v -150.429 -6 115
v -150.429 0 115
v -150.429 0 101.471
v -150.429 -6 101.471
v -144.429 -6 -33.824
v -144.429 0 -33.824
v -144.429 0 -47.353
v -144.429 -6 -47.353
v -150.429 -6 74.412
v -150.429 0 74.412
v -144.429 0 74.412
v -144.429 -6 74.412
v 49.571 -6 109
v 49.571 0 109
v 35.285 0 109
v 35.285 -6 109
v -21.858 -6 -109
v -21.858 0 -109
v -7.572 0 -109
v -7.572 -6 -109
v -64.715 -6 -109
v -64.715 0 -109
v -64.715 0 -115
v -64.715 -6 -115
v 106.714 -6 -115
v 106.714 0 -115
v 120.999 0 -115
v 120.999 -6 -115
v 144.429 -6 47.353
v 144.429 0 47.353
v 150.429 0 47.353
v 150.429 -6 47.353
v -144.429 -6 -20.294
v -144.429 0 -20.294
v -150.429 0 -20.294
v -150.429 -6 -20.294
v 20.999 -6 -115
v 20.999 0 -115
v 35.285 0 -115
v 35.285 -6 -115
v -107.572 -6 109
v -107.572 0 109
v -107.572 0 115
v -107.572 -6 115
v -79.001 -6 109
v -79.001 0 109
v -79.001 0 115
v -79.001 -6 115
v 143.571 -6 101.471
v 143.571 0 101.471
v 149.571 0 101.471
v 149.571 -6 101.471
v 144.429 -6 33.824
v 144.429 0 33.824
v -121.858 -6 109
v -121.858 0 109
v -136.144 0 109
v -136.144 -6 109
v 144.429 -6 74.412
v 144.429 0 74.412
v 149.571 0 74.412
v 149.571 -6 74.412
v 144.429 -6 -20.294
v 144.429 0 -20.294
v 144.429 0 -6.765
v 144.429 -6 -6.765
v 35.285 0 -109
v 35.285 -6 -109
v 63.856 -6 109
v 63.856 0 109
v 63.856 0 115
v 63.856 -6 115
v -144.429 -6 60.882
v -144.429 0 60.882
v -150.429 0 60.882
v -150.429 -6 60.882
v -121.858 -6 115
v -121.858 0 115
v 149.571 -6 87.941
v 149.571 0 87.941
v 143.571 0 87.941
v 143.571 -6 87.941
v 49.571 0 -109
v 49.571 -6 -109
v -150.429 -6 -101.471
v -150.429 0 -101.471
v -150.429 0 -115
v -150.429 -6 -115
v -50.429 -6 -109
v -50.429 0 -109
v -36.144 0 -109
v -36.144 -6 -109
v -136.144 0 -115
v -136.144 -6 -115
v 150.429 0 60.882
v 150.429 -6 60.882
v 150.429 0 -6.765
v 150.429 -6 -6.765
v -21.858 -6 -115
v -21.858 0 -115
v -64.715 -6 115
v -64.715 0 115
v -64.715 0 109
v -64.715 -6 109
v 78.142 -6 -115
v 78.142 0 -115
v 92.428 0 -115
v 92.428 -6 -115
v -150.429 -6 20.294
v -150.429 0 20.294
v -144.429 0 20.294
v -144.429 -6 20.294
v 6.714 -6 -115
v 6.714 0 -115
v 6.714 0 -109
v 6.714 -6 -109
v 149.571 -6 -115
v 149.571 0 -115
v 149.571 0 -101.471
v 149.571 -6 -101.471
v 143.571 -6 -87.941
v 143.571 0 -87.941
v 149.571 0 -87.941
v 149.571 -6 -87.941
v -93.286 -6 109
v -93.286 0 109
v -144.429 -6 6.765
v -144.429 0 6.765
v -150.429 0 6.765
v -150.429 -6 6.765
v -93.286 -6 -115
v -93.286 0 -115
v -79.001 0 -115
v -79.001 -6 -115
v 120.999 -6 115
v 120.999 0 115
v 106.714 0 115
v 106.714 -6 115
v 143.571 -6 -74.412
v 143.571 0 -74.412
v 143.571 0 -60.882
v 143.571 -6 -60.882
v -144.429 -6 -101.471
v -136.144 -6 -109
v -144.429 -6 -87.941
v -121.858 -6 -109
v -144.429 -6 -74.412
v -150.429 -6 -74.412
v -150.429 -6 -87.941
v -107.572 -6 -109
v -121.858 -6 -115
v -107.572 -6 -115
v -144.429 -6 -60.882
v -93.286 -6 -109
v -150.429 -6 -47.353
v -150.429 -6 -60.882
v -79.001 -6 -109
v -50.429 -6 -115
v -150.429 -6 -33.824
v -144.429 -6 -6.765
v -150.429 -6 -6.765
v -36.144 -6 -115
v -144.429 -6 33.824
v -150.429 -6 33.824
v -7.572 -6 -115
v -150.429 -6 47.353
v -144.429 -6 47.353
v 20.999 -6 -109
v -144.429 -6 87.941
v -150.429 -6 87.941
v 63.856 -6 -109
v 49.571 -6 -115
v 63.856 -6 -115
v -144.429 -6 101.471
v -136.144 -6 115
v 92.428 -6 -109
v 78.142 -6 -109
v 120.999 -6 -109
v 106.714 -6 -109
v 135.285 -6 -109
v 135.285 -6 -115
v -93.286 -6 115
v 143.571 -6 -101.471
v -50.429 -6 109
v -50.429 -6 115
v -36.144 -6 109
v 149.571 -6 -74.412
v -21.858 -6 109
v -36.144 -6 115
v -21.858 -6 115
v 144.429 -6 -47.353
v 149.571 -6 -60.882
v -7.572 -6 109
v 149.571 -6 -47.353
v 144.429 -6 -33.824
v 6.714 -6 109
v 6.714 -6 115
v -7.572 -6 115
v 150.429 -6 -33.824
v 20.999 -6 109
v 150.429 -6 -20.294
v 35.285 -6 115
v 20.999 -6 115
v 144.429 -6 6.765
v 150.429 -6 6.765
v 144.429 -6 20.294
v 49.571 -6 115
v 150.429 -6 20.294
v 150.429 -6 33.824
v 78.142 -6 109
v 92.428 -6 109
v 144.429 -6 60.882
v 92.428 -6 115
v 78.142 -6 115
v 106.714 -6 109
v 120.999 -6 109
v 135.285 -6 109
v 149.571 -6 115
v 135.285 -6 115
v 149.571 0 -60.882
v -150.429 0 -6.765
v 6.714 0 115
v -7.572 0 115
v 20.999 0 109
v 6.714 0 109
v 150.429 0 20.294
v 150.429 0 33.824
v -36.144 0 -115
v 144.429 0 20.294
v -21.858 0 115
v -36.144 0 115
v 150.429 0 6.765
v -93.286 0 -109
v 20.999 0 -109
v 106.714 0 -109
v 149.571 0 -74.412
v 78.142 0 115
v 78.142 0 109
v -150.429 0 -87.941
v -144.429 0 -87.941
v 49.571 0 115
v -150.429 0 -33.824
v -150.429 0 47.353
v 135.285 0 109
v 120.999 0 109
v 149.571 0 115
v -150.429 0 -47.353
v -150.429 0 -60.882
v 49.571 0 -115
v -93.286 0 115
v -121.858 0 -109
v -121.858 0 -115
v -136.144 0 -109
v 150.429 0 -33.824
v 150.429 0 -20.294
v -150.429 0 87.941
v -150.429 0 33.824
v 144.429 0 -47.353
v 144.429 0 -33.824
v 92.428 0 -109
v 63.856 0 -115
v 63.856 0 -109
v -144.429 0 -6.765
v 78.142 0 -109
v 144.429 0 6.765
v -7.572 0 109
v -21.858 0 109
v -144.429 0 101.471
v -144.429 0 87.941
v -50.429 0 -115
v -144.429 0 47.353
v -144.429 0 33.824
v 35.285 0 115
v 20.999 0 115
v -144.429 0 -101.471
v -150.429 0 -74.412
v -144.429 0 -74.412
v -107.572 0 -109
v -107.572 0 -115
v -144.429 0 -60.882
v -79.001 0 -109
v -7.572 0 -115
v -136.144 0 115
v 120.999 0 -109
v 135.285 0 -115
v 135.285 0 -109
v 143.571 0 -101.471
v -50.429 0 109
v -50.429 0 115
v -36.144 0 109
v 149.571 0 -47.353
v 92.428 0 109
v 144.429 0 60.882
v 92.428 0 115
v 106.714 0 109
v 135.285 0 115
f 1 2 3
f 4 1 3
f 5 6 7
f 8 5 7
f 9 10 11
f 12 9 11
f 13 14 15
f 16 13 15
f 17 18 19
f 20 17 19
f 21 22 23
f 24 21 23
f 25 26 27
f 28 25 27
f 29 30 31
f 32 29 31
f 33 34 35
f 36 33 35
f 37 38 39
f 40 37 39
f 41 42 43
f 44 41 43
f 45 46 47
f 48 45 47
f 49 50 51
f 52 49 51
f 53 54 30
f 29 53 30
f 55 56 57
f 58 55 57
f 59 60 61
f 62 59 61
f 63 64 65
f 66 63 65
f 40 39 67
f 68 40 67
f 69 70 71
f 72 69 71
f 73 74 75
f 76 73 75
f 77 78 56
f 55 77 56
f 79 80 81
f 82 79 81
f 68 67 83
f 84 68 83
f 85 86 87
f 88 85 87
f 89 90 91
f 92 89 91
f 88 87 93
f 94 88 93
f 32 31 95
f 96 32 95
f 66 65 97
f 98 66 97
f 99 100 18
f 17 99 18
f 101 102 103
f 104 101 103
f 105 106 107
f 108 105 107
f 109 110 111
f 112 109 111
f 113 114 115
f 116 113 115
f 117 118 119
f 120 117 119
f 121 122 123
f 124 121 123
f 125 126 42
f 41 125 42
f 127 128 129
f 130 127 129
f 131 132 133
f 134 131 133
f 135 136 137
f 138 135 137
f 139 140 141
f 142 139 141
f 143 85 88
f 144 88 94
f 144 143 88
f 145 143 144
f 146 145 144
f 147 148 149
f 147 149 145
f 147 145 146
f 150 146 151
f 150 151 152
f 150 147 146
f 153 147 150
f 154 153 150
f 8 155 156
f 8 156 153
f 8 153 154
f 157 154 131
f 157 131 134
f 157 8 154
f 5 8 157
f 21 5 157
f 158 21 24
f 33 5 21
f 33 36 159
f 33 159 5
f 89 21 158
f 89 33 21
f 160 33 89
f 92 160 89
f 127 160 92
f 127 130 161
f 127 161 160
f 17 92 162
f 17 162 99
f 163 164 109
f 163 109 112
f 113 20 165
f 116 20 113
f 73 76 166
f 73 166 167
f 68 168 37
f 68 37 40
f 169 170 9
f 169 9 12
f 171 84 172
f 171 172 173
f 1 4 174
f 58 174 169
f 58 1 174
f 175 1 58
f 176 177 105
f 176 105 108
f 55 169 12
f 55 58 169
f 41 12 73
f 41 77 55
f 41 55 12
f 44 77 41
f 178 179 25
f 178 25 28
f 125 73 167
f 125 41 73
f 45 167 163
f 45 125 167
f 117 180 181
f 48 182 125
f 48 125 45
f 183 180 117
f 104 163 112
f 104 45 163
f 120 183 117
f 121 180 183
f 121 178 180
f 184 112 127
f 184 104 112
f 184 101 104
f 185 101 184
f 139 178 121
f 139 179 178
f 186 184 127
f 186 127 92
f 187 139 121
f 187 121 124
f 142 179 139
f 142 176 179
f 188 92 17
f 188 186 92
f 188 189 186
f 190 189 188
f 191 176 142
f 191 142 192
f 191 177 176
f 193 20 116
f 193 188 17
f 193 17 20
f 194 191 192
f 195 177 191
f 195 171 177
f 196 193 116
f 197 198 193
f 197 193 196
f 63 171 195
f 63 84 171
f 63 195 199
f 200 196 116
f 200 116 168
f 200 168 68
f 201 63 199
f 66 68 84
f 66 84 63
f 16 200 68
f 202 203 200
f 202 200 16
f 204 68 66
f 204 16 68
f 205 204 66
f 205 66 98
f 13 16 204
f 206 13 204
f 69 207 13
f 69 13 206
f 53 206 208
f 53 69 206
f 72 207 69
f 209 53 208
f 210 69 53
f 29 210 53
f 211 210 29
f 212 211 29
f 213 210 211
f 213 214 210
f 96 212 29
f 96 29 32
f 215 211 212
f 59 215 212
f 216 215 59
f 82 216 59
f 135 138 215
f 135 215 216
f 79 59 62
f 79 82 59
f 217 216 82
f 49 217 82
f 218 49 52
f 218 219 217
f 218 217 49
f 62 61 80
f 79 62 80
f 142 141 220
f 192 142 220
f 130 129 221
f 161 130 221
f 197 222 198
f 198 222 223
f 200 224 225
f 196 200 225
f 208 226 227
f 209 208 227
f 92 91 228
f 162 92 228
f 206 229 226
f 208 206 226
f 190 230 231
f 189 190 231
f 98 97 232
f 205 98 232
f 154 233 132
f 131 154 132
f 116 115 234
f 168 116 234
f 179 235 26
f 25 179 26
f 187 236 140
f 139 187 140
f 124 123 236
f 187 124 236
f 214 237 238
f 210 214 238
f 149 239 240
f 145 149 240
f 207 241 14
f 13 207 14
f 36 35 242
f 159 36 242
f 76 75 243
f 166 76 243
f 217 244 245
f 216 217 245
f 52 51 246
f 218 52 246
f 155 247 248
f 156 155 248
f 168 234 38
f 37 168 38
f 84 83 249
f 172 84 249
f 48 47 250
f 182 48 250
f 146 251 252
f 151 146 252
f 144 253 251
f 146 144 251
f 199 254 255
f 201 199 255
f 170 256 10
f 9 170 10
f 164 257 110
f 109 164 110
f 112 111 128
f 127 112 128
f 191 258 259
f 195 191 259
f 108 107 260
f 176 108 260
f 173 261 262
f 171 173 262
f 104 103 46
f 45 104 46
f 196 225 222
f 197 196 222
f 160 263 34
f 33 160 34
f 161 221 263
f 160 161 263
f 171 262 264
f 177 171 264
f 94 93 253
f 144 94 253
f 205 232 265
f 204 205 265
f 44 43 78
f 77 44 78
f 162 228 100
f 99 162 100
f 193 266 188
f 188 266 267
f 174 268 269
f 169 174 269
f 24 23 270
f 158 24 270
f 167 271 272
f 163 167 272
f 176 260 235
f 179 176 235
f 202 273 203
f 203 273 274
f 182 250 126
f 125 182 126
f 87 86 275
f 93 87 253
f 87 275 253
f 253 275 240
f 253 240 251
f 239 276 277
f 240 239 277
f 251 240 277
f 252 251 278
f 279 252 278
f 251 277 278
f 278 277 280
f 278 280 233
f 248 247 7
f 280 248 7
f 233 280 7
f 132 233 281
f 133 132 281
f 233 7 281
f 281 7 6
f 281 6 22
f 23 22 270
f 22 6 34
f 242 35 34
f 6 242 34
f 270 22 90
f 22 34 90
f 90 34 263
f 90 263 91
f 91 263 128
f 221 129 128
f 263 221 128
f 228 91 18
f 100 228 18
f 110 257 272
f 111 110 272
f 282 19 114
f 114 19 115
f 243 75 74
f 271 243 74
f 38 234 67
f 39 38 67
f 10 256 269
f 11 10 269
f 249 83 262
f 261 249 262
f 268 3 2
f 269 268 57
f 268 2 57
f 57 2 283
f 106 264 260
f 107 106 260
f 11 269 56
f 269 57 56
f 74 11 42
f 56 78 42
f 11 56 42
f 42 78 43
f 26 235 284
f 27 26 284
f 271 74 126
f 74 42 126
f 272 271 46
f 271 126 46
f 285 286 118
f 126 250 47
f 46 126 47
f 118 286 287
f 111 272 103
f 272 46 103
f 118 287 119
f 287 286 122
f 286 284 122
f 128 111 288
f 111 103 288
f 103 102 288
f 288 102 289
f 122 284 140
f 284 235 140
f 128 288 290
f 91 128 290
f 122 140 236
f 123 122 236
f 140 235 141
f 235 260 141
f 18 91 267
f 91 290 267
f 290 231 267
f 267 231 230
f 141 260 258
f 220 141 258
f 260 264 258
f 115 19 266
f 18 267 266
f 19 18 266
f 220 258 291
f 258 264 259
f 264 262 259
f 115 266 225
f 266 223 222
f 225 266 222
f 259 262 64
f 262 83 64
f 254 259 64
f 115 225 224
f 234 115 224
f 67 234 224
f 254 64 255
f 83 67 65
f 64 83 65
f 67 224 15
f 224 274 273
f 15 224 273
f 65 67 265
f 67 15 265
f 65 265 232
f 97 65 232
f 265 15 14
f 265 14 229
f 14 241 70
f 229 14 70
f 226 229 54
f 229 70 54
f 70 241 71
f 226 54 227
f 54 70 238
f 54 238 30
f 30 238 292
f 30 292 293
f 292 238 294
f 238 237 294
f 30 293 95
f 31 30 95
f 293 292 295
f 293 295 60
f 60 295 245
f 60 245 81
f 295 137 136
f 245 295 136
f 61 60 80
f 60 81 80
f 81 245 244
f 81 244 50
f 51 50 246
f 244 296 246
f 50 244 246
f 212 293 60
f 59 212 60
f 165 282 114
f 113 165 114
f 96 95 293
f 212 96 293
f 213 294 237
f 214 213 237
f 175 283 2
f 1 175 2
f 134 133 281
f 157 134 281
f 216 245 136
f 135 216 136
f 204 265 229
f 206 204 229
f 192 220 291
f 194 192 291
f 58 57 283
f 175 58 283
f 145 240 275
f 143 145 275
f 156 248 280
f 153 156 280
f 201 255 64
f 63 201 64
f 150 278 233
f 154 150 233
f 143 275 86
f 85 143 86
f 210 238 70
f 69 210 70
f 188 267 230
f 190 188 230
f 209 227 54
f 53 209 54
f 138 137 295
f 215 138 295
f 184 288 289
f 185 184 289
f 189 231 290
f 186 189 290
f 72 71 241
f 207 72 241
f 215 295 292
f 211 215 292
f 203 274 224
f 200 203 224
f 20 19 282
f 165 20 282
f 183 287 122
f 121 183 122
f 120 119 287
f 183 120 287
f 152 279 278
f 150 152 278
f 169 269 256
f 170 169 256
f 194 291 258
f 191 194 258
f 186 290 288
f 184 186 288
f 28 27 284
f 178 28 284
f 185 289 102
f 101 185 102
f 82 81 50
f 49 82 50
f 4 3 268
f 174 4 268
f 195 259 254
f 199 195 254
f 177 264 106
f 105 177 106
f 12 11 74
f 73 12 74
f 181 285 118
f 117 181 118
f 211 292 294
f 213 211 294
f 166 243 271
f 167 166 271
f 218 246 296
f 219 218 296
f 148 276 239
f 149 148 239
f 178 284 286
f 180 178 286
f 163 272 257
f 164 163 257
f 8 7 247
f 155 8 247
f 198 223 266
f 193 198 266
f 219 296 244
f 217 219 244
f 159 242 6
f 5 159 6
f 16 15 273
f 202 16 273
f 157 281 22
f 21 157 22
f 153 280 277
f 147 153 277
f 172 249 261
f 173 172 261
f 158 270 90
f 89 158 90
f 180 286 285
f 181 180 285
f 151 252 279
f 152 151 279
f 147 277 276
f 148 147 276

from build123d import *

# Parameters (mm, degrees)
F1_DEPTH = 6


with BuildPart() as f1:
    # F0 (on Front) → F1 (new body)
    with BuildSketch(Plane.XZ):
        Polygon((-136.143627, 115), (-150.429341, 115), (-150.429341, 101.470588), (-144.429341, 101.470588), (-144.429341, 87.941176), (-150.429341, 87.941176), (-150.429341, 74.411765), (-144.429341, 74.411765), (-144.429341, 60.882353), (-150.429341, 60.882353), (-150.429341, 47.352941), (-144.429341, 47.352941), (-144.429341, 33.823529), (-150.429341, 33.823529), (-150.429341, 20.294118), (-144.429341, 20.294118), (-144.429341, 6.764706), (-150.429341, 6.764706), (-150.429341, -6.764706), (-144.429341, -6.764706), (-144.429341, -20.294118), (-150.429341, -20.294118), (-150.429341, -33.823529), (-144.429341, -33.823529), (-144.429341, -47.352941), (-150.429341, -47.352941), (-150.429341, -60.882353), (-144.429341, -60.882353), (-144.429341, -74.411765), (-150.429341, -74.411765), (-150.429341, -87.941176), (-144.429341, -87.941176), (-144.429341, -101.470588), (-150.429341, -101.470588), (-150.429341, -115), (-136.143627, -115), (-136.143627, -109), (-121.857913, -109), (-121.857913, -115), (-107.572198, -115), (-107.572198, -109), (-93.286484, -109), (-93.286484, -115), (-79.00077, -115), (-79.00077, -109), (-64.715055, -109), (-64.715055, -115), (-50.429341, -115), (-50.429341, -109), (-36.143627, -109), (-36.143627, -115), (-21.857913, -115), (-21.857913, -109), (-7.572198, -109), (-7.572198, -115), (6.713516, -115), (6.713516, -109), (20.99923, -109), (20.99923, -115), (35.284945, -115), (35.284945, -109), (49.570659, -109), (49.570659, -115), (63.856373, -115), (63.856373, -109), (78.142087, -109), (78.142087, -115), (92.427802, -115), (92.427802, -109), (106.713516, -109), (106.713516, -115), (120.99923, -115), (120.99923, -109), (135.284945, -109), (135.284945, -115), (149.570659, -115), (149.570659, -101.470588), (143.570659, -101.470588), (143.570659, -87.941176), (149.570659, -87.941176), (149.570659, -74.411765), (143.570659, -74.411765), (143.570659, -60.882353), (149.570659, -60.882353), (149.570659, -47.352941), (144.429341, -47.352941), (144.429341, -33.823529), (150.429341, -33.823529), (150.429341, -20.294118), (144.429341, -20.294118), (144.429341, -6.764706), (150.429341, -6.764706), (150.429341, 6.764706), (144.429341, 6.764706), (144.429341, 20.294118), (150.429341, 20.294118), (150.429341, 33.823529), (144.429341, 33.823529), (144.429341, 47.352941), (150.429341, 47.352941), (150.429341, 60.882353), (144.429341, 60.882353), (144.429341, 74.411765), (149.570659, 74.411765), (149.570659, 87.941176), (143.570659, 87.941176), (143.570659, 101.470588), (149.570659, 101.470588), (149.570659, 115), (135.284945, 115), (135.284945, 109), (120.99923, 109), (120.99923, 115), (106.713516, 115), (106.713516, 109), (92.427802, 109), (92.427802, 115), (78.142087, 115), (78.142087, 109), (63.856373, 109), (63.856373, 115), (49.570659, 115), (49.570659, 109), (35.284945, 109), (35.284945, 115), (20.99923, 115), (20.99923, 109), (6.713516, 109), (6.713516, 115), (-7.572198, 115), (-7.572198, 109), (-21.857913, 109), (-21.857913, 115), (-36.143627, 115), (-36.143627, 109), (-50.429341, 109), (-50.429341, 115), (-64.715055, 115), (-64.715055, 109), (-79.00077, 109), (-79.00077, 115), (-93.286484, 115), (-93.286484, 109), (-107.572198, 109), (-107.572198, 115), (-121.857913, 115), (-121.857913, 109), (-136.143627, 109), align=None)
    extrude(amount=F1_DEPTH)


solid = f1.part
